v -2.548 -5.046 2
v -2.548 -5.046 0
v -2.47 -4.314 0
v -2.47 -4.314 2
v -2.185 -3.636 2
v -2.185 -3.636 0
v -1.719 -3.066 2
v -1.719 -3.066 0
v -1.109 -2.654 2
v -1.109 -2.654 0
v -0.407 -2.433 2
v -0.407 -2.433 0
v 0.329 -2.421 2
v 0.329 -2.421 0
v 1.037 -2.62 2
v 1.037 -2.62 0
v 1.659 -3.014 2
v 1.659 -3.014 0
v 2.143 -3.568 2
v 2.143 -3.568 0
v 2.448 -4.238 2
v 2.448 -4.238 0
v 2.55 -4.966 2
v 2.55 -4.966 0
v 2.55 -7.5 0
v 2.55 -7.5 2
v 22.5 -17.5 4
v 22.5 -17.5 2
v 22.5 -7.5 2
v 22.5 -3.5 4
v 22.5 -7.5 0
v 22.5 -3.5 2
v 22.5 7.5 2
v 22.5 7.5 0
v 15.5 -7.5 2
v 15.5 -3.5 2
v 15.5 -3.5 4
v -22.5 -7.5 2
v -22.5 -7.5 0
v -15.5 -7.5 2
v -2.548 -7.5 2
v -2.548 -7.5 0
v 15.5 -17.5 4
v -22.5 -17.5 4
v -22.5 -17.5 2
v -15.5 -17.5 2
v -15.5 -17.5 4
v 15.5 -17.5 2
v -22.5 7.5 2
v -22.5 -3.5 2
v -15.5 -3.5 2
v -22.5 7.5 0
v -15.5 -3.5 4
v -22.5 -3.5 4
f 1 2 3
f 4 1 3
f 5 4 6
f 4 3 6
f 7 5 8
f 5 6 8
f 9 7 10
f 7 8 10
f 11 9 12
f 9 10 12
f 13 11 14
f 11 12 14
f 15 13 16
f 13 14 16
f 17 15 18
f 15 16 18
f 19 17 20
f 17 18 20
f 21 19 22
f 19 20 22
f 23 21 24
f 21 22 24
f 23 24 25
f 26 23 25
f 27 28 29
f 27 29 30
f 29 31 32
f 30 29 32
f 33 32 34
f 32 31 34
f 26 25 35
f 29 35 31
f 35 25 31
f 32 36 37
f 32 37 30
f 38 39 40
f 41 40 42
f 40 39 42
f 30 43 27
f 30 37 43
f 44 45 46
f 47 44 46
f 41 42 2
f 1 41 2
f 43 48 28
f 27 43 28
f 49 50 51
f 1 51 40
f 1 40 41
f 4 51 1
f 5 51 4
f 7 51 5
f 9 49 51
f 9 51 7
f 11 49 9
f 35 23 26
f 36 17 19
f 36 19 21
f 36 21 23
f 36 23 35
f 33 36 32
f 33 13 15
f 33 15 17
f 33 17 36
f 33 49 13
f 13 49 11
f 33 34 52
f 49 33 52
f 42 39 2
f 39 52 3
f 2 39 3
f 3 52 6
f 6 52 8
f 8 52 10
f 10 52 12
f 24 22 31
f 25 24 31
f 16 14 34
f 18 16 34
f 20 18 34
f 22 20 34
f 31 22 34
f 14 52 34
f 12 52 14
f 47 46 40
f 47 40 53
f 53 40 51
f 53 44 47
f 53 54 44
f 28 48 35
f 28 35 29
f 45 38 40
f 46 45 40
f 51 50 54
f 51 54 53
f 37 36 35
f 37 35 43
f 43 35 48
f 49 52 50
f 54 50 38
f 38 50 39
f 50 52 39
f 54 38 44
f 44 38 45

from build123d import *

# Parameters (mm, degrees)
F1_DEPTH = 2
F2_W     = 7
F2_H     = 10
F2_H_2   = 4
F3_DEPTH = 2


with BuildPart() as f1:
    # F0 (on Top) → F1 (new body)
    with BuildSketch(Plane.XY):
        with BuildLine():
            Line((2.549947, -7.5), (22.5, -7.5))
            Line((22.5, -7.5), (22.5, 7.5))
            Line((22.5, 7.5), (-22.5, 7.5))
            Line((-22.5, 7.5), (-22.5, -7.5))
            Line((-22.5, -7.5), (-2.548188, -7.5))
            Line((-2.548188, -7.5), (-2.548188, -5.046103))
            ThreePointArc((-2.548188, -5.046103), (-0.039812, -2.400311), (2.549947, -4.966498))
            Line((2.549947, -4.966498), (2.549947, -7.5))
        make_face()
    extrude(amount=F1_DEPTH)

    # F2 (on face) → F3 (join)
    with BuildSketch(Plane.XY.offset(2)):
        with Locations((-19, -12.5)):
            Rectangle(F2_W, F2_H)
        with Locations((-19, -5.5)):
            Rectangle(F2_W, F2_H_2)
        with Locations((19, -12.5)):
            Rectangle(F2_W, F2_H)
        with Locations((19, -5.5)):
            Rectangle(F2_W, F2_H_2)
    extrude(amount=F3_DEPTH)


solid = f1.part
